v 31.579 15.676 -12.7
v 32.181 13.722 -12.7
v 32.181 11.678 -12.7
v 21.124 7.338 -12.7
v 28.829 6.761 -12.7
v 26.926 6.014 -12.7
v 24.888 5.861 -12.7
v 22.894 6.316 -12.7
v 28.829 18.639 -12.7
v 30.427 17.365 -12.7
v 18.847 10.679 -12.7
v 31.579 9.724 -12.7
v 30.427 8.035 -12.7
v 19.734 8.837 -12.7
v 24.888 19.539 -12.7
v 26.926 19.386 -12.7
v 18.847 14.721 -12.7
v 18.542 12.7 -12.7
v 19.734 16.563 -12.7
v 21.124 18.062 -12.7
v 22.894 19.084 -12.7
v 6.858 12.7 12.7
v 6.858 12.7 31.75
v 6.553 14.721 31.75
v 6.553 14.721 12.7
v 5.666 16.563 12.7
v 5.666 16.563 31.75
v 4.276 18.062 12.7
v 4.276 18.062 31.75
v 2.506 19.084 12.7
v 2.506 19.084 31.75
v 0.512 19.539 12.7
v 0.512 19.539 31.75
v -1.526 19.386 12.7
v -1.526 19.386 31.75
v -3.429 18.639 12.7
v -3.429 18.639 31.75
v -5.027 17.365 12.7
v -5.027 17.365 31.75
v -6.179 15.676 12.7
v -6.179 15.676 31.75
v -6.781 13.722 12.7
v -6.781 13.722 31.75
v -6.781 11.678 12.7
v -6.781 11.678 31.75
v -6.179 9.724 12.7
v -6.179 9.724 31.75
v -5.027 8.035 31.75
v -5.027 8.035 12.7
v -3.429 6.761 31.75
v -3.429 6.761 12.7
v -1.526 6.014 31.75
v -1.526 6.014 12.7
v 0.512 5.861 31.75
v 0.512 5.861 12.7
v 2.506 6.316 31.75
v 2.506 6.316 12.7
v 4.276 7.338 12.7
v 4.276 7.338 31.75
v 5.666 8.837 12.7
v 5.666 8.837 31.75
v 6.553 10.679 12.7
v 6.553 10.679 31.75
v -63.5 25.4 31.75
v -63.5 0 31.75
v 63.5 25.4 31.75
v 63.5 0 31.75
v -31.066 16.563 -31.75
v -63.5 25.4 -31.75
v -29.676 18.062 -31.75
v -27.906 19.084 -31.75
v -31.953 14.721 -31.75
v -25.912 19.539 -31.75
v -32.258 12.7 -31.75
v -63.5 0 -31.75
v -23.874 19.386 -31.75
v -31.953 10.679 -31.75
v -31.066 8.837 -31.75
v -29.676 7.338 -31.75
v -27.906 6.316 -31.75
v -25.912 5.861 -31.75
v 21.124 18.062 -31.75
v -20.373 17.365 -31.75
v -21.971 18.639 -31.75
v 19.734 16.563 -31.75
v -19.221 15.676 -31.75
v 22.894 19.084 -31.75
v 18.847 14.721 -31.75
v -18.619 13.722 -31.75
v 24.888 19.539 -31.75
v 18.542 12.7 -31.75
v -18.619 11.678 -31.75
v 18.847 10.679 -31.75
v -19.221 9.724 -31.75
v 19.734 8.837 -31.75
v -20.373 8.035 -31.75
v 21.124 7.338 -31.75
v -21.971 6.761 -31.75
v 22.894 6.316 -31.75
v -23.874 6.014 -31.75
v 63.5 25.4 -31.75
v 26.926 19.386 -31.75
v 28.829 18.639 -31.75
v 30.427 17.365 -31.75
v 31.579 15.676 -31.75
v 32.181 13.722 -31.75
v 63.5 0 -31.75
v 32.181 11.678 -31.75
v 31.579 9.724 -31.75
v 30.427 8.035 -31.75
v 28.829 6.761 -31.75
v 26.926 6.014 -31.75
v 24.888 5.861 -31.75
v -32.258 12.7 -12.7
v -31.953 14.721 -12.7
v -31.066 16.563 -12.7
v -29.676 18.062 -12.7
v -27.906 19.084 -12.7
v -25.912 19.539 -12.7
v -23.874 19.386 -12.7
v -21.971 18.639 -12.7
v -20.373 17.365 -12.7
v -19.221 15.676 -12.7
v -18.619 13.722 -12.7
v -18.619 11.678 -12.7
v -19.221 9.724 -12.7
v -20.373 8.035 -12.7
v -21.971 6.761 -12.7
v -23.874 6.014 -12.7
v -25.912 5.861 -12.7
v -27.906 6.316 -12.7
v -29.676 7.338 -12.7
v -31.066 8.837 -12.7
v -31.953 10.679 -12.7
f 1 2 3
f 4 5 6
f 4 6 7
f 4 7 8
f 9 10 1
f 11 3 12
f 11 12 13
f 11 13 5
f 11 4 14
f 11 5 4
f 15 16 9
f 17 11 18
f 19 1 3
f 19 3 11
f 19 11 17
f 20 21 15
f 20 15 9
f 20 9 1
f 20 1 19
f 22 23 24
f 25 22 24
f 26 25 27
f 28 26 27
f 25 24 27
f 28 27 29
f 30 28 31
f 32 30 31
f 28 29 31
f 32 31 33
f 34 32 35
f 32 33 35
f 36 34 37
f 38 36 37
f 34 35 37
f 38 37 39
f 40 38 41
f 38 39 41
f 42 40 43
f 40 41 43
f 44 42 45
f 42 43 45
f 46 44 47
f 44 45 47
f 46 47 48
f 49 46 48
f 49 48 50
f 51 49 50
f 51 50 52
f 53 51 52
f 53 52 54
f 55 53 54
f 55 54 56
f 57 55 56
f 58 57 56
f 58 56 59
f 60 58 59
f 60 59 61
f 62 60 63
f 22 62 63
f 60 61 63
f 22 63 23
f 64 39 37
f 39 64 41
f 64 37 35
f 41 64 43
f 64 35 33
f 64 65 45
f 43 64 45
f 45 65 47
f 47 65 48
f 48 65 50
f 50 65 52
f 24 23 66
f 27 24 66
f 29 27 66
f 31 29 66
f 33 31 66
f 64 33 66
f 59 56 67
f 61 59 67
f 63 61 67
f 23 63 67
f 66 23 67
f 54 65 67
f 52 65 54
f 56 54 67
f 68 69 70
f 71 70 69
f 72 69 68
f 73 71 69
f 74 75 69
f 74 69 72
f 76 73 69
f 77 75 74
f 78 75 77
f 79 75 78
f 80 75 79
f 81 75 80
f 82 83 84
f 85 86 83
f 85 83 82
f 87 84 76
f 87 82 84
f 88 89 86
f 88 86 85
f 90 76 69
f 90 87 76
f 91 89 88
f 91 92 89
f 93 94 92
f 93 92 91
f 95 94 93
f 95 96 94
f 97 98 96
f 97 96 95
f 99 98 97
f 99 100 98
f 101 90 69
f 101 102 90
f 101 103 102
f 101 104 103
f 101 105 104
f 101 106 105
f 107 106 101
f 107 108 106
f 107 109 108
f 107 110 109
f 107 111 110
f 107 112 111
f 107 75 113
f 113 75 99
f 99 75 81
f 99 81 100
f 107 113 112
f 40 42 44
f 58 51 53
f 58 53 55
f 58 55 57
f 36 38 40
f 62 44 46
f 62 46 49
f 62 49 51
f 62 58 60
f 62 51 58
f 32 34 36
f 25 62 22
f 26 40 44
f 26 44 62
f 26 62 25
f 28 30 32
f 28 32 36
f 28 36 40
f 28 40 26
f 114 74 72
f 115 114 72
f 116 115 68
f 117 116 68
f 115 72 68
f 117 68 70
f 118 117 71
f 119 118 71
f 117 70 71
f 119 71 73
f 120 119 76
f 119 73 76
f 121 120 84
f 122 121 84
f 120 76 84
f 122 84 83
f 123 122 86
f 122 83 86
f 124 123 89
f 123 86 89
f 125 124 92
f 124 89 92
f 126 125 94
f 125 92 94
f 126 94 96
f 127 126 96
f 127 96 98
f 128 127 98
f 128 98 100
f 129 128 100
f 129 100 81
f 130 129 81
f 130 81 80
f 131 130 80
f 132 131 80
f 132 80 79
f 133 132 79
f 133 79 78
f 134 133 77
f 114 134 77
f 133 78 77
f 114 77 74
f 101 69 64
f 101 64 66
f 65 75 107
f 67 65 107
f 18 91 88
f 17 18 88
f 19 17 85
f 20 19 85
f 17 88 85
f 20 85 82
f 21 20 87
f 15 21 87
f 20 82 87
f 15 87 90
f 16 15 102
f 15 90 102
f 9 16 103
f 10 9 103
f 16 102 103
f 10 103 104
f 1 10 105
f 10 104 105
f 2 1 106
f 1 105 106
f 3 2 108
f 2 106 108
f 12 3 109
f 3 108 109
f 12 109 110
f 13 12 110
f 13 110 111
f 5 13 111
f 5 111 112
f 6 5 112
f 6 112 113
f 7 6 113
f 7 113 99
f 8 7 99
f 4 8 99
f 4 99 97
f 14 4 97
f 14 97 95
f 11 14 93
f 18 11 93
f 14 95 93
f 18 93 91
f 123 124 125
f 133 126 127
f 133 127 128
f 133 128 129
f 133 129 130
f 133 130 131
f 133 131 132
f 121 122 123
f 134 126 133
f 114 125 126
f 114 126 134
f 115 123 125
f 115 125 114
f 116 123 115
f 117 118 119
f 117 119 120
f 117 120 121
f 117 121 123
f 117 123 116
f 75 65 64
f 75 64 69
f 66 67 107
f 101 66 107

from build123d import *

# Parameters (mm, degrees)
SKETCH1_W           = 127
SKETCH1_H           = 63.5
BOSS_EXTRUDE1_DEPTH = 25.4
SKETCH2_R           = 6.858
CUT_EXTRUDE1_DEPTH  = 19.05
SKETCH3_R           = 6.858
CUT_EXTRUDE2_DEPTH  = 19.05


with BuildPart() as part:
    # Sketch1 → Boss-Extrude1 (new body)
    with BuildSketch(Plane(origin=(0, 0, 0), x_dir=(1, 0, 0), z_dir=(0, 1, 0))):
        Rectangle(SKETCH1_W, SKETCH1_H)
    extrude(amount=BOSS_EXTRUDE1_DEPTH)

    # Sketch2 → Cut-Extrude1 (cut)
    with BuildSketch(Plane.XY.offset(31.75)):
        with Locations((0, 12.7)):
            Circle(SKETCH2_R)
    extrude(amount=-CUT_EXTRUDE1_DEPTH, mode=Mode.SUBTRACT)

    # Sketch3 → Cut-Extrude2 (cut)
    with BuildSketch(Plane(origin=(0, 0, -31.75), x_dir=(-1, 0, 0), z_dir=(0, 0, -1))):
        with Locations((25.4, 12.7)):
            Circle(SKETCH3_R)
        with Locations((-25.4, 12.7)):
            Circle(SKETCH3_R)
    extrude(amount=-CUT_EXTRUDE2_DEPTH, mode=Mode.SUBTRACT)


solid = part.part
